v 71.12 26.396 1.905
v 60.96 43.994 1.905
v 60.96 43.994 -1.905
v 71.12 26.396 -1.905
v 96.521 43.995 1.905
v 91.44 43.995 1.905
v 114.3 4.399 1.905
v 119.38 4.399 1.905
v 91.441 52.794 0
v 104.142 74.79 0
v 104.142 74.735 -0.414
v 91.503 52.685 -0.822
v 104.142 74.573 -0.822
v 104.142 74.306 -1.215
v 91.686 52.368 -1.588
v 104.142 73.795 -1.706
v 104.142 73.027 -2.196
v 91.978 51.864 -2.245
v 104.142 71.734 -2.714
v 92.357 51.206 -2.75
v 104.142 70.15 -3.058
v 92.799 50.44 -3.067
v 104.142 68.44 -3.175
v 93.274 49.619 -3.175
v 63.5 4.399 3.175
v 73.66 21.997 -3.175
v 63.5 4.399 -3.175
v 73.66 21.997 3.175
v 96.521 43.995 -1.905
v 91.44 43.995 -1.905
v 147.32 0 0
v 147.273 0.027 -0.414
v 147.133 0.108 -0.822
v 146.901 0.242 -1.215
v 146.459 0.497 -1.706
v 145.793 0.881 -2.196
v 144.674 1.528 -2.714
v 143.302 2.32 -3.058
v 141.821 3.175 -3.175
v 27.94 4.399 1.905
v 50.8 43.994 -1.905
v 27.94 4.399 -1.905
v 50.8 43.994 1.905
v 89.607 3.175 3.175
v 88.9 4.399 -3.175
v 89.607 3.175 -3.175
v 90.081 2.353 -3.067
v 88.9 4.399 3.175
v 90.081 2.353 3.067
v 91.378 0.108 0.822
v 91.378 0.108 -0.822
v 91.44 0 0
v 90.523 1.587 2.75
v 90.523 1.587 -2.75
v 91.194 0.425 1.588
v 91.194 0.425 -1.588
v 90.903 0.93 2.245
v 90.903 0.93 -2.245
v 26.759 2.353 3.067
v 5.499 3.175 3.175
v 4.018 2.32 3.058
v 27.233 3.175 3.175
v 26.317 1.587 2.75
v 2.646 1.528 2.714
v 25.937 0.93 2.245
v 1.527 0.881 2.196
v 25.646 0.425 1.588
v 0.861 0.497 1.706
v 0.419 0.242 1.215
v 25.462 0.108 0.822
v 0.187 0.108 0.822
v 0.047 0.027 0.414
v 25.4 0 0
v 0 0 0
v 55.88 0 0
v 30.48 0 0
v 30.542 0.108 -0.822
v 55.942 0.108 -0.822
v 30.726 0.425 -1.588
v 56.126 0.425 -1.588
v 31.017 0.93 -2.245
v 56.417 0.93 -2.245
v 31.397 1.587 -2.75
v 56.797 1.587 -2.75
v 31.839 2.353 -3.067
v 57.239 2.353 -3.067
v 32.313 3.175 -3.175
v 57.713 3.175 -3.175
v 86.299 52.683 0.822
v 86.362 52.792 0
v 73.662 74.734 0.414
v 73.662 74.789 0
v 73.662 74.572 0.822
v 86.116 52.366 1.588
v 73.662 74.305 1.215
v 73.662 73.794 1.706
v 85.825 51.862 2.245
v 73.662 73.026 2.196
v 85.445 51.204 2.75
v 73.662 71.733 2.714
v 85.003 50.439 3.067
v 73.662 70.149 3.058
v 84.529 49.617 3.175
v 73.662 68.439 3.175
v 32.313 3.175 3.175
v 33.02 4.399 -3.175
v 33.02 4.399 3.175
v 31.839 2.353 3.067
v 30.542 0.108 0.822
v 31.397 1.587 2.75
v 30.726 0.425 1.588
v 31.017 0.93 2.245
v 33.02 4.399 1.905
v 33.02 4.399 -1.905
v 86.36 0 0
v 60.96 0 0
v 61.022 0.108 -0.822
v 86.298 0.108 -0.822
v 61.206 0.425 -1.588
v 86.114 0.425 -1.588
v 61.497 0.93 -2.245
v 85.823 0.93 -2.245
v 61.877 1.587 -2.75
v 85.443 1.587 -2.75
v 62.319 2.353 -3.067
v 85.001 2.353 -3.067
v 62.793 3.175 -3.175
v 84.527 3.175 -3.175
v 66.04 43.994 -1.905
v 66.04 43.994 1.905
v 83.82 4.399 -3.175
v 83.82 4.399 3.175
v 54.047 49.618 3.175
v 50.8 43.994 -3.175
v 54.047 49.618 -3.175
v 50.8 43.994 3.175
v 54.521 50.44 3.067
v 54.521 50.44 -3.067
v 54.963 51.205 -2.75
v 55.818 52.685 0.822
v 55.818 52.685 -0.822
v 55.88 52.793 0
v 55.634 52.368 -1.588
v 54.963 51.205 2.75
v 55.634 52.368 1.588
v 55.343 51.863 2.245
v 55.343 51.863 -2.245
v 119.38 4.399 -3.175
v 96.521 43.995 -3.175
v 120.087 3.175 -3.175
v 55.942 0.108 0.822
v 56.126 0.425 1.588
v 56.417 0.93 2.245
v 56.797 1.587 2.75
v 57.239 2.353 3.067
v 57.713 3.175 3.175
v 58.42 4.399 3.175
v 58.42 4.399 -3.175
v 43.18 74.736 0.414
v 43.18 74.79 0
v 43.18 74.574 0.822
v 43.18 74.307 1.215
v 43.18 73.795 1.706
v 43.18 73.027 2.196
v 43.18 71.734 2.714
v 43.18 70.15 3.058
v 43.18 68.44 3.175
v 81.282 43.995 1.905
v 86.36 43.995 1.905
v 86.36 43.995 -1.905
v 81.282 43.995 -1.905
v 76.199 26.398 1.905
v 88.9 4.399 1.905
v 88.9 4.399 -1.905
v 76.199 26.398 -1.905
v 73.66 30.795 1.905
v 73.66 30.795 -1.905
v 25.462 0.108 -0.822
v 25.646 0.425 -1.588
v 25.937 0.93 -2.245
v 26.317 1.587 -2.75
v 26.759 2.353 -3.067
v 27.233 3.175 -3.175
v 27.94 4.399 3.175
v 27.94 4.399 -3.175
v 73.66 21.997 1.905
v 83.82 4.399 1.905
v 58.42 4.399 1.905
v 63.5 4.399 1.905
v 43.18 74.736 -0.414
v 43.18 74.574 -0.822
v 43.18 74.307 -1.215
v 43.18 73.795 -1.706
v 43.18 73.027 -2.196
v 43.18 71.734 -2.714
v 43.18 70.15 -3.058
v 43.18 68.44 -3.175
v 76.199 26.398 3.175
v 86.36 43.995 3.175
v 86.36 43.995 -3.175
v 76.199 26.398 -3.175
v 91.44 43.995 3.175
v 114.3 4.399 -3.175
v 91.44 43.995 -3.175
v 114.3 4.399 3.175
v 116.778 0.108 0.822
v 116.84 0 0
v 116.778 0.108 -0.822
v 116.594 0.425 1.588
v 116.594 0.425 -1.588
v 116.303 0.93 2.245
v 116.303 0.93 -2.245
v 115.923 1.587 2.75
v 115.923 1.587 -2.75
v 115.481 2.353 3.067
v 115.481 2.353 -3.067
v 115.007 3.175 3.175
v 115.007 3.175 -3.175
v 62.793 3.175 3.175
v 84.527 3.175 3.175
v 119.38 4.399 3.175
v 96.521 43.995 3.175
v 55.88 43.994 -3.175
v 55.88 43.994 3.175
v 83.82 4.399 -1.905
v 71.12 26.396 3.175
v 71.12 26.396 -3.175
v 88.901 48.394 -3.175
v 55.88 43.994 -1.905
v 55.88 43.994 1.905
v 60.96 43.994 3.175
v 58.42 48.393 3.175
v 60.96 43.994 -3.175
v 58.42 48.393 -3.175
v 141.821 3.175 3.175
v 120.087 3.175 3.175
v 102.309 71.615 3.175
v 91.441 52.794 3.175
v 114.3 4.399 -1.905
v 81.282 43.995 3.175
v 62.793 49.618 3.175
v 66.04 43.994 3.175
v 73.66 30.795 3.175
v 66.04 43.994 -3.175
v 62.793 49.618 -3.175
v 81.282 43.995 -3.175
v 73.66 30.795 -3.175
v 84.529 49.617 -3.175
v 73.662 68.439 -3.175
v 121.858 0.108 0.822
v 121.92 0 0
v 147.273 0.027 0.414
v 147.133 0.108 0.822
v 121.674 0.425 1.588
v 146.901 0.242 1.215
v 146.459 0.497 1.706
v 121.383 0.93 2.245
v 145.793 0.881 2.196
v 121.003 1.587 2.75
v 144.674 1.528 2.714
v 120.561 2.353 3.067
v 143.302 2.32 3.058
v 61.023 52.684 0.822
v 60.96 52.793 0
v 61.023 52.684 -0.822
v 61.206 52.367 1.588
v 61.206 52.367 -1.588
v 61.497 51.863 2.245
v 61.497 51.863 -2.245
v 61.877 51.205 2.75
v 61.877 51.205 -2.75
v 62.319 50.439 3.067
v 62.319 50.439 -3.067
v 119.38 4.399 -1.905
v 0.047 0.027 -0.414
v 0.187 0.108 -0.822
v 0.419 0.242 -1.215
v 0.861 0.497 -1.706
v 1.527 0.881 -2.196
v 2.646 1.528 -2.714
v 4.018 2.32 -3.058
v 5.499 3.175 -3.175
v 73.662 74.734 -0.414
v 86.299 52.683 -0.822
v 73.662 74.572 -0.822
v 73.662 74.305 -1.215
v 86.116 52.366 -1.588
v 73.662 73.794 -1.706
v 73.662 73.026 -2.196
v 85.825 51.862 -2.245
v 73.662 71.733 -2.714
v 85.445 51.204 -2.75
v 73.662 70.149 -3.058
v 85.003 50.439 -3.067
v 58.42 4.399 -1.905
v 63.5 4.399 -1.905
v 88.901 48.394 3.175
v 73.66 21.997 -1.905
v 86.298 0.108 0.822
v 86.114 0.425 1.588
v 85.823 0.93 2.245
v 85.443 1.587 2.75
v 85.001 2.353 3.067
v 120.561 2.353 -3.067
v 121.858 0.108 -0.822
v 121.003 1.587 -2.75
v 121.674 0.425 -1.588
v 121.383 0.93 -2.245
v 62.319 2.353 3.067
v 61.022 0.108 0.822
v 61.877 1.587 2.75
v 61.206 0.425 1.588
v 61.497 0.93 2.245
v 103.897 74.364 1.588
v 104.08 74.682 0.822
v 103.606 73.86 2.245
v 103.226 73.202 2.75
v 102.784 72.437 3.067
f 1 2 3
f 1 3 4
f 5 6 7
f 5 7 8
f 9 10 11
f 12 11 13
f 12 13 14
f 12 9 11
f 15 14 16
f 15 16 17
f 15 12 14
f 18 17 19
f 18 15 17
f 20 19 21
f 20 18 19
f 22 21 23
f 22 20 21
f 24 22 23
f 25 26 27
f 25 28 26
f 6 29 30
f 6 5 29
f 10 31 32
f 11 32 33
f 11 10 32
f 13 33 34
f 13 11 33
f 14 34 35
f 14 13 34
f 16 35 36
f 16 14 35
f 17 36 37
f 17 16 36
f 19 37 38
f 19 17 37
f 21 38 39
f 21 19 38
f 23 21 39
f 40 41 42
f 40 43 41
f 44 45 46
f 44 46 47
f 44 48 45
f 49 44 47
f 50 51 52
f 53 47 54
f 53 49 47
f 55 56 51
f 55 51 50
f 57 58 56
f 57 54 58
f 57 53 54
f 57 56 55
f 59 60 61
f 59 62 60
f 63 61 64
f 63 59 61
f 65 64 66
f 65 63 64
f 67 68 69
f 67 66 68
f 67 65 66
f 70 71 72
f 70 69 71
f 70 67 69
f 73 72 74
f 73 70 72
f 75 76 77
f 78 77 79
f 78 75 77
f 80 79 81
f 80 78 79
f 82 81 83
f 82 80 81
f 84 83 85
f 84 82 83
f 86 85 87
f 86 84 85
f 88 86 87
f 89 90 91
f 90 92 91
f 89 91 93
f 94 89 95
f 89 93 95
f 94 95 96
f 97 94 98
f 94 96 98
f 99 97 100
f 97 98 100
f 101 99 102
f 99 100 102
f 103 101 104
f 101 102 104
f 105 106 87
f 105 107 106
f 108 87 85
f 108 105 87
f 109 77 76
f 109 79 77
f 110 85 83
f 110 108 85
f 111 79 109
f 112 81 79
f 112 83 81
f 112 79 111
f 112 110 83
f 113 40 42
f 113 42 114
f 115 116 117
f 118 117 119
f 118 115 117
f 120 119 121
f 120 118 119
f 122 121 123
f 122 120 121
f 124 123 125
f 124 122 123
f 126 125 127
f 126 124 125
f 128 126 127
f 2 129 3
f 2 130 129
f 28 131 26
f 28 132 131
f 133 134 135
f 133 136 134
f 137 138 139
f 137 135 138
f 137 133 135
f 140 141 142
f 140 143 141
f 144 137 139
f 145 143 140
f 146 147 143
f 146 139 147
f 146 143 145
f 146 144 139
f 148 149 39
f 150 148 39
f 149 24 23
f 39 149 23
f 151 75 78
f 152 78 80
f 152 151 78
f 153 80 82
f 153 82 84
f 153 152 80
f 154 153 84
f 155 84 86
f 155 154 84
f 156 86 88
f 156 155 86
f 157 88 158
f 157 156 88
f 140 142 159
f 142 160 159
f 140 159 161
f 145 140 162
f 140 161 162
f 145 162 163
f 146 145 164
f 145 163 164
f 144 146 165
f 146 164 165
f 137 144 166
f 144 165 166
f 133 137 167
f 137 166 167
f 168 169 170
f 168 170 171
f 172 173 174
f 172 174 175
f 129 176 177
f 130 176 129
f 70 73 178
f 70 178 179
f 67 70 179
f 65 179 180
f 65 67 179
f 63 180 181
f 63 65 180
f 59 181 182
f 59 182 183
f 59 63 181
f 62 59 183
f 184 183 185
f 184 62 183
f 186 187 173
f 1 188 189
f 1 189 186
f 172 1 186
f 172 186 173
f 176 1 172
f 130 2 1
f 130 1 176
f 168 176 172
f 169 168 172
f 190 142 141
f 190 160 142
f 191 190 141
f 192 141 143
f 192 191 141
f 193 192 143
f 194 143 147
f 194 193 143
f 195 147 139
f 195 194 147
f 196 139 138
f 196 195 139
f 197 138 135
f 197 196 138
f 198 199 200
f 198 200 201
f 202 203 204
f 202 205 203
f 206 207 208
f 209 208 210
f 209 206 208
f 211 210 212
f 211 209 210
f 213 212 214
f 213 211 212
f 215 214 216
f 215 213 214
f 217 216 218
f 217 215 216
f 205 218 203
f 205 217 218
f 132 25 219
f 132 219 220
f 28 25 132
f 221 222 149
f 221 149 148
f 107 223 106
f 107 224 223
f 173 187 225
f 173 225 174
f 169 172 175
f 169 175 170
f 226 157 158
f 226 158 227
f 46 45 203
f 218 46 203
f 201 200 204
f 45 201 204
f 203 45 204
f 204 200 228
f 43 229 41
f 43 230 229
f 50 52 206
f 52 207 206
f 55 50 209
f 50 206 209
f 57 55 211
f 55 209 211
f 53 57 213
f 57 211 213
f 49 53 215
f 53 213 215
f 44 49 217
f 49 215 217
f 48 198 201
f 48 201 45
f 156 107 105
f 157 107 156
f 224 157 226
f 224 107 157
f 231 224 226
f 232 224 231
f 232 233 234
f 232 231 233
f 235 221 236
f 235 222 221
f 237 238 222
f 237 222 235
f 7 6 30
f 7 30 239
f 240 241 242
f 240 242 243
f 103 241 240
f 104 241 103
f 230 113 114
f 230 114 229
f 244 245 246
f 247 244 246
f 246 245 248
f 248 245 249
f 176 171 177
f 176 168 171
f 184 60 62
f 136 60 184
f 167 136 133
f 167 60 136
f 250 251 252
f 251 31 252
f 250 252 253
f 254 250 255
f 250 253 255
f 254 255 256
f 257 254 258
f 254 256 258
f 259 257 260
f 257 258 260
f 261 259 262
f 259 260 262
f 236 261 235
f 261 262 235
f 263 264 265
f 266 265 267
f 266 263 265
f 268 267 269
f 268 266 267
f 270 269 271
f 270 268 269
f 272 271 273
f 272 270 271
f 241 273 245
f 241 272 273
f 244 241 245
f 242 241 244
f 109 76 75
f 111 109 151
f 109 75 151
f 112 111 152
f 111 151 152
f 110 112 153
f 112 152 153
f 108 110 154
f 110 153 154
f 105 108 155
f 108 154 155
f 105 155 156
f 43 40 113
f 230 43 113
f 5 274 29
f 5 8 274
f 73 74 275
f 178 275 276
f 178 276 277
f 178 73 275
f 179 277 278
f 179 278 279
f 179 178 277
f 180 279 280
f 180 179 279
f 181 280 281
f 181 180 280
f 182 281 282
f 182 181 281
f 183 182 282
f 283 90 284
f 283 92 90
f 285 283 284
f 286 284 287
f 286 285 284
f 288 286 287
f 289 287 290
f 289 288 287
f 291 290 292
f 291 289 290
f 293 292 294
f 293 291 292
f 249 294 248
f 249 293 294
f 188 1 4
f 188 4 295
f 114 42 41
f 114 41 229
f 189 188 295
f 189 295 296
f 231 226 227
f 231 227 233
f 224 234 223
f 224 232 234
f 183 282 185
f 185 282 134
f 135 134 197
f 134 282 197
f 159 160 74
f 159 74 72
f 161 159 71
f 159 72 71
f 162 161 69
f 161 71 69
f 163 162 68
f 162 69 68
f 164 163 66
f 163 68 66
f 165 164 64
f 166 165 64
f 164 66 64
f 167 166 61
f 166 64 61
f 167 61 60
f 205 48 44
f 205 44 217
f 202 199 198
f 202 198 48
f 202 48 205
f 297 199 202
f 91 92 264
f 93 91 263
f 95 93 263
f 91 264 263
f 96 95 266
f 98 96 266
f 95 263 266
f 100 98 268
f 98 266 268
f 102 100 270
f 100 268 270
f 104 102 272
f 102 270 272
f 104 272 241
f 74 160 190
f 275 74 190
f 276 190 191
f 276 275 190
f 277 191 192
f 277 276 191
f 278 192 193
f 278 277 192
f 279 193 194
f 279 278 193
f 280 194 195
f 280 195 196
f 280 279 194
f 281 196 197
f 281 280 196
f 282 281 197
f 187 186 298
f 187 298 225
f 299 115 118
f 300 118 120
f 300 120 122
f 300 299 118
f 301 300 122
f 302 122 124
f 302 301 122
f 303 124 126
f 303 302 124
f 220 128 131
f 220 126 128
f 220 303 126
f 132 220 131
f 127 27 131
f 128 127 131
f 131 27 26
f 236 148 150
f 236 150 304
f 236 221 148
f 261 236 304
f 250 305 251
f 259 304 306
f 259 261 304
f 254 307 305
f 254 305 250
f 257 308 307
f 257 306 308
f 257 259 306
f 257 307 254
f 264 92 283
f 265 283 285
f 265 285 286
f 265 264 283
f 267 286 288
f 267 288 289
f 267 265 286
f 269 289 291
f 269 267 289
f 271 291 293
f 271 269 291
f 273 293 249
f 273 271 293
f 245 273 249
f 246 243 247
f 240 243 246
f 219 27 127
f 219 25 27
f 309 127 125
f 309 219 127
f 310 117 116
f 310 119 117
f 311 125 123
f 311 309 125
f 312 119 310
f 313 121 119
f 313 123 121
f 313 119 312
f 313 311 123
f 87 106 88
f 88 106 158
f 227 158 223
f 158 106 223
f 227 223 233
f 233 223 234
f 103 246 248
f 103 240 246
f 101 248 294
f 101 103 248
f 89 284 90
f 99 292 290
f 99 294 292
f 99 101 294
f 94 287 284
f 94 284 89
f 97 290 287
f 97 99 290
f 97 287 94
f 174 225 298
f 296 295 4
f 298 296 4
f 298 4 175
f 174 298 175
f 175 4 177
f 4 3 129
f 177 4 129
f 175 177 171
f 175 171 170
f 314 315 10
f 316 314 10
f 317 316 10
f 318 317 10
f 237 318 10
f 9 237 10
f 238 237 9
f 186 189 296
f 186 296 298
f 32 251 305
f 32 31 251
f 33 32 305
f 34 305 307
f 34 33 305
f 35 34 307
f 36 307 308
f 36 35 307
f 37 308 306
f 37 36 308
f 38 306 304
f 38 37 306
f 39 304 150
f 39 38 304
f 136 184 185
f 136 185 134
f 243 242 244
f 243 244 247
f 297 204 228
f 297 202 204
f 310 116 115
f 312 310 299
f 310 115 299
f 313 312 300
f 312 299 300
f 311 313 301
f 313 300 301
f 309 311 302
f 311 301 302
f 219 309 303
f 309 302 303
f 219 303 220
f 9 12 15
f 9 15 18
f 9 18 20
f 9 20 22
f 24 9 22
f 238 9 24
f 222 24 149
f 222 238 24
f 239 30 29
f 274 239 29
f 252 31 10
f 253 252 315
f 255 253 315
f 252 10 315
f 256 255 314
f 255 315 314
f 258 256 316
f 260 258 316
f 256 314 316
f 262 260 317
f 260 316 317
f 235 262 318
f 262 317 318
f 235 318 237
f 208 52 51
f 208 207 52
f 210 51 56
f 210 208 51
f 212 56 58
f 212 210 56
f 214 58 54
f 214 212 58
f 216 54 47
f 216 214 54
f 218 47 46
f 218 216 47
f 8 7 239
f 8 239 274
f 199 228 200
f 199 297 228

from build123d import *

# Parameters (mm, degrees)
F1_DEPTH = 3.175
F2_DEPTH = 1.905
F3_R     = 3.17499
F3_2_R   = 3.17499
F3_3_R   = 3.17499
F3_4_R   = 3.17499
F3_5_R   = 3.17499
F3_6_R   = 3.17499


# Not quite as in the source:
# - a fillet or chamfer is up to 0.001 mm smaller than in the source, because OpenCascade refuses the exact size


with BuildPart() as f1:
    # F0 (on Top) → F1 (new body, symmetric)
    with BuildSketch(Plane.XY):
        Polygon((43.18, 74.7899538708), (0, 0), (25.4, 0), (27.94, 4.3994090512), (50.8, 43.9940905122), (55.88, 52.7929086147), align=None)
    extrude(amount=F1_DEPTH, both=True)

    # F3 (radius 3.175 in the source; OpenCascade refuses exactly that, so slightly less here)
    f3_edges = [f1.edges().sort_by_distance(p)[0] for p in [
        (21.59, 37.394977, 3.175),
        (21.59, 37.394977, -3.175),
        (12.7, 0, -3.175),
        (12.7, 0, 3.175),
        (49.53, 63.791431, 3.175),
        (49.53, 63.791431, -3.175),
    ]]
    fillet(f3_edges, radius=F3_R)


with BuildPart() as f1b:
    # F0 (on Top) → F1, piece 2 (new body, symmetric)
    with BuildSketch(Plane.XY):
        Polygon((55.88, 43.9940905122), (33.02, 4.3994090512), (30.48, 0), (55.88, 0), (58.42, 4.3994090512), (71.12, 26.3964543073), (60.96, 43.9940905122), (58.42, 48.3934995635), align=None)
    extrude(amount=F1_DEPTH, both=True)

    # F3#3 (radius 3.175 in the source; OpenCascade refuses exactly that, so slightly less here)
    f3_3_edges = [f1b.edges().sort_by_distance(p)[0] for p in [
        (43.18, 0, -3.175),
        (43.18, 0, 3.175),
    ]]
    fillet(f3_3_edges, radius=F3_3_R)


with BuildPart() as f1c:
    # F0 (on Top) → F1, piece 3 (new body, symmetric)
    with BuildSketch(Plane.XY):
        Polygon((60.9602140859, 52.792537807), (66.04, 43.9940905122), (73.6602140859, 30.7954925508), (81.2823551529, 43.9952028573), (86.3618197643, 52.79161069), (73.6618197643, 74.7886559461), align=None)
    extrude(amount=F1_DEPTH, both=True)

    # F3#2 (radius 3.175 in the source; OpenCascade refuses exactly that, so slightly less here)
    f3_2_edges = [f1c.edges().sort_by_distance(p)[0] for p in [
        (67.311017, 63.790597, 3.175),
        (80.01182, 63.790133, 3.175),
        (80.01182, 63.790133, -3.175),
        (67.311017, 63.790597, -3.175),
    ]]
    fillet(f3_2_edges, radius=F3_2_R)


with BuildPart() as f1d:
    # F0 (on Top) → F1, piece 4 (new body, symmetric)
    with BuildSketch(Plane.XY):
        Polygon((88.9005352487, 48.3944264851), (86.360214113, 43.9952028573), (76.1989295703, 26.398308346), (88.9, 4.3994090512), (91.44, 0), (116.84, 0), (114.300072982, 4.3994511866), (91.4404622667, 43.9949752986), align=None)
    extrude(amount=F1_DEPTH, both=True)

    # F3#5 (radius 3.175 in the source; OpenCascade refuses exactly that, so slightly less here)
    f3_5_edges = [f1d.edges().sort_by_distance(p)[0] for p in [
        (104.14, 0, -3.175),
        (104.14, 0, 3.175),
    ]]
    fillet(f3_5_edges, radius=F3_5_R)


with BuildPart() as f1e:
    # F0 (on Top) → F1, piece 5 (new body, symmetric)
    with BuildSketch(Plane.XY):
        Polygon((73.66, 21.9970452561), (63.5, 4.3994090512), (60.96, 0), (86.36, 0), (83.82, 4.3994090512), align=None)
    extrude(amount=F1_DEPTH, both=True)

    # F3#4 (radius 3.175 in the source; OpenCascade refuses exactly that, so slightly less here)
    f3_4_edges = [f1e.edges().sort_by_distance(p)[0] for p in [
        (73.66, 0, -3.175),
        (73.66, 0, 3.175),
    ]]
    fillet(f3_4_edges, radius=F3_4_R)


with BuildPart() as f1f:
    # F0 (on Top) → F1, piece 6 (new body, symmetric)
    with BuildSketch(Plane.XY):
        Polygon((91.4408563844, 52.793650113), (96.520559582, 43.9949752986), (119.3800827134, 4.3994511866), (121.92, 0), (147.32, 0), (104.1424620628, 74.7897682521), align=None)
    extrude(amount=F1_DEPTH, both=True)

    # F3#6 (radius 3.175 in the source; OpenCascade refuses exactly that, so slightly less here)
    f3_6_edges = [f1f.edges().sort_by_distance(p)[0] for p in [
        (134.62, 0, -3.175),
        (125.731231, 37.394884, -3.175),
        (97.791659, 63.791709, -3.175),
        (134.62, 0, 3.175),
        (125.731231, 37.394884, 3.175),
    ]]
    fillet(f3_6_edges, radius=F3_6_R)


with BuildPart() as f2:
    # F0 (on Top) → F2 (new body, symmetric)
    with BuildSketch(Plane.XY):
        Polygon((96.520559582, 43.9949752986), (91.4404622667, 43.9949752986), (114.300072982, 4.3994511866), (119.3800827134, 4.3994511866), align=None)
    extrude(amount=F2_DEPTH, both=True)


with BuildPart() as f2b:
    # F0 (on Top) → F2, piece 2 (new body, symmetric)
    with BuildSketch(Plane.XY):
        Polygon((66.04, 43.9940905122), (60.96, 43.9940905122), (71.12, 26.3964543073), (58.42, 4.3994090512), (63.5, 4.3994090512), (73.66, 21.9970452561), (83.82, 4.3994090512), (88.9, 4.3994090512), (76.1989295703, 26.398308346), (86.360214113, 43.9952028573), (81.2823551529, 43.9952028573), (73.6602140859, 30.7954925508), align=None)
    extrude(amount=F2_DEPTH, both=True)


with BuildPart() as f2c:
    # F0 (on Top) → F2, piece 3 (new body, symmetric)
    with BuildSketch(Plane.XY):
        Polygon((50.8, 43.9940905122), (27.94, 4.3994090512), (33.02, 4.3994090512), (55.88, 43.9940905122), align=None)
    extrude(amount=F2_DEPTH, both=True)


solid = Compound([f1.part, f1b.part, f1c.part, f1d.part, f1e.part, f1f.part, f2.part, f2b.part, f2c.part])
